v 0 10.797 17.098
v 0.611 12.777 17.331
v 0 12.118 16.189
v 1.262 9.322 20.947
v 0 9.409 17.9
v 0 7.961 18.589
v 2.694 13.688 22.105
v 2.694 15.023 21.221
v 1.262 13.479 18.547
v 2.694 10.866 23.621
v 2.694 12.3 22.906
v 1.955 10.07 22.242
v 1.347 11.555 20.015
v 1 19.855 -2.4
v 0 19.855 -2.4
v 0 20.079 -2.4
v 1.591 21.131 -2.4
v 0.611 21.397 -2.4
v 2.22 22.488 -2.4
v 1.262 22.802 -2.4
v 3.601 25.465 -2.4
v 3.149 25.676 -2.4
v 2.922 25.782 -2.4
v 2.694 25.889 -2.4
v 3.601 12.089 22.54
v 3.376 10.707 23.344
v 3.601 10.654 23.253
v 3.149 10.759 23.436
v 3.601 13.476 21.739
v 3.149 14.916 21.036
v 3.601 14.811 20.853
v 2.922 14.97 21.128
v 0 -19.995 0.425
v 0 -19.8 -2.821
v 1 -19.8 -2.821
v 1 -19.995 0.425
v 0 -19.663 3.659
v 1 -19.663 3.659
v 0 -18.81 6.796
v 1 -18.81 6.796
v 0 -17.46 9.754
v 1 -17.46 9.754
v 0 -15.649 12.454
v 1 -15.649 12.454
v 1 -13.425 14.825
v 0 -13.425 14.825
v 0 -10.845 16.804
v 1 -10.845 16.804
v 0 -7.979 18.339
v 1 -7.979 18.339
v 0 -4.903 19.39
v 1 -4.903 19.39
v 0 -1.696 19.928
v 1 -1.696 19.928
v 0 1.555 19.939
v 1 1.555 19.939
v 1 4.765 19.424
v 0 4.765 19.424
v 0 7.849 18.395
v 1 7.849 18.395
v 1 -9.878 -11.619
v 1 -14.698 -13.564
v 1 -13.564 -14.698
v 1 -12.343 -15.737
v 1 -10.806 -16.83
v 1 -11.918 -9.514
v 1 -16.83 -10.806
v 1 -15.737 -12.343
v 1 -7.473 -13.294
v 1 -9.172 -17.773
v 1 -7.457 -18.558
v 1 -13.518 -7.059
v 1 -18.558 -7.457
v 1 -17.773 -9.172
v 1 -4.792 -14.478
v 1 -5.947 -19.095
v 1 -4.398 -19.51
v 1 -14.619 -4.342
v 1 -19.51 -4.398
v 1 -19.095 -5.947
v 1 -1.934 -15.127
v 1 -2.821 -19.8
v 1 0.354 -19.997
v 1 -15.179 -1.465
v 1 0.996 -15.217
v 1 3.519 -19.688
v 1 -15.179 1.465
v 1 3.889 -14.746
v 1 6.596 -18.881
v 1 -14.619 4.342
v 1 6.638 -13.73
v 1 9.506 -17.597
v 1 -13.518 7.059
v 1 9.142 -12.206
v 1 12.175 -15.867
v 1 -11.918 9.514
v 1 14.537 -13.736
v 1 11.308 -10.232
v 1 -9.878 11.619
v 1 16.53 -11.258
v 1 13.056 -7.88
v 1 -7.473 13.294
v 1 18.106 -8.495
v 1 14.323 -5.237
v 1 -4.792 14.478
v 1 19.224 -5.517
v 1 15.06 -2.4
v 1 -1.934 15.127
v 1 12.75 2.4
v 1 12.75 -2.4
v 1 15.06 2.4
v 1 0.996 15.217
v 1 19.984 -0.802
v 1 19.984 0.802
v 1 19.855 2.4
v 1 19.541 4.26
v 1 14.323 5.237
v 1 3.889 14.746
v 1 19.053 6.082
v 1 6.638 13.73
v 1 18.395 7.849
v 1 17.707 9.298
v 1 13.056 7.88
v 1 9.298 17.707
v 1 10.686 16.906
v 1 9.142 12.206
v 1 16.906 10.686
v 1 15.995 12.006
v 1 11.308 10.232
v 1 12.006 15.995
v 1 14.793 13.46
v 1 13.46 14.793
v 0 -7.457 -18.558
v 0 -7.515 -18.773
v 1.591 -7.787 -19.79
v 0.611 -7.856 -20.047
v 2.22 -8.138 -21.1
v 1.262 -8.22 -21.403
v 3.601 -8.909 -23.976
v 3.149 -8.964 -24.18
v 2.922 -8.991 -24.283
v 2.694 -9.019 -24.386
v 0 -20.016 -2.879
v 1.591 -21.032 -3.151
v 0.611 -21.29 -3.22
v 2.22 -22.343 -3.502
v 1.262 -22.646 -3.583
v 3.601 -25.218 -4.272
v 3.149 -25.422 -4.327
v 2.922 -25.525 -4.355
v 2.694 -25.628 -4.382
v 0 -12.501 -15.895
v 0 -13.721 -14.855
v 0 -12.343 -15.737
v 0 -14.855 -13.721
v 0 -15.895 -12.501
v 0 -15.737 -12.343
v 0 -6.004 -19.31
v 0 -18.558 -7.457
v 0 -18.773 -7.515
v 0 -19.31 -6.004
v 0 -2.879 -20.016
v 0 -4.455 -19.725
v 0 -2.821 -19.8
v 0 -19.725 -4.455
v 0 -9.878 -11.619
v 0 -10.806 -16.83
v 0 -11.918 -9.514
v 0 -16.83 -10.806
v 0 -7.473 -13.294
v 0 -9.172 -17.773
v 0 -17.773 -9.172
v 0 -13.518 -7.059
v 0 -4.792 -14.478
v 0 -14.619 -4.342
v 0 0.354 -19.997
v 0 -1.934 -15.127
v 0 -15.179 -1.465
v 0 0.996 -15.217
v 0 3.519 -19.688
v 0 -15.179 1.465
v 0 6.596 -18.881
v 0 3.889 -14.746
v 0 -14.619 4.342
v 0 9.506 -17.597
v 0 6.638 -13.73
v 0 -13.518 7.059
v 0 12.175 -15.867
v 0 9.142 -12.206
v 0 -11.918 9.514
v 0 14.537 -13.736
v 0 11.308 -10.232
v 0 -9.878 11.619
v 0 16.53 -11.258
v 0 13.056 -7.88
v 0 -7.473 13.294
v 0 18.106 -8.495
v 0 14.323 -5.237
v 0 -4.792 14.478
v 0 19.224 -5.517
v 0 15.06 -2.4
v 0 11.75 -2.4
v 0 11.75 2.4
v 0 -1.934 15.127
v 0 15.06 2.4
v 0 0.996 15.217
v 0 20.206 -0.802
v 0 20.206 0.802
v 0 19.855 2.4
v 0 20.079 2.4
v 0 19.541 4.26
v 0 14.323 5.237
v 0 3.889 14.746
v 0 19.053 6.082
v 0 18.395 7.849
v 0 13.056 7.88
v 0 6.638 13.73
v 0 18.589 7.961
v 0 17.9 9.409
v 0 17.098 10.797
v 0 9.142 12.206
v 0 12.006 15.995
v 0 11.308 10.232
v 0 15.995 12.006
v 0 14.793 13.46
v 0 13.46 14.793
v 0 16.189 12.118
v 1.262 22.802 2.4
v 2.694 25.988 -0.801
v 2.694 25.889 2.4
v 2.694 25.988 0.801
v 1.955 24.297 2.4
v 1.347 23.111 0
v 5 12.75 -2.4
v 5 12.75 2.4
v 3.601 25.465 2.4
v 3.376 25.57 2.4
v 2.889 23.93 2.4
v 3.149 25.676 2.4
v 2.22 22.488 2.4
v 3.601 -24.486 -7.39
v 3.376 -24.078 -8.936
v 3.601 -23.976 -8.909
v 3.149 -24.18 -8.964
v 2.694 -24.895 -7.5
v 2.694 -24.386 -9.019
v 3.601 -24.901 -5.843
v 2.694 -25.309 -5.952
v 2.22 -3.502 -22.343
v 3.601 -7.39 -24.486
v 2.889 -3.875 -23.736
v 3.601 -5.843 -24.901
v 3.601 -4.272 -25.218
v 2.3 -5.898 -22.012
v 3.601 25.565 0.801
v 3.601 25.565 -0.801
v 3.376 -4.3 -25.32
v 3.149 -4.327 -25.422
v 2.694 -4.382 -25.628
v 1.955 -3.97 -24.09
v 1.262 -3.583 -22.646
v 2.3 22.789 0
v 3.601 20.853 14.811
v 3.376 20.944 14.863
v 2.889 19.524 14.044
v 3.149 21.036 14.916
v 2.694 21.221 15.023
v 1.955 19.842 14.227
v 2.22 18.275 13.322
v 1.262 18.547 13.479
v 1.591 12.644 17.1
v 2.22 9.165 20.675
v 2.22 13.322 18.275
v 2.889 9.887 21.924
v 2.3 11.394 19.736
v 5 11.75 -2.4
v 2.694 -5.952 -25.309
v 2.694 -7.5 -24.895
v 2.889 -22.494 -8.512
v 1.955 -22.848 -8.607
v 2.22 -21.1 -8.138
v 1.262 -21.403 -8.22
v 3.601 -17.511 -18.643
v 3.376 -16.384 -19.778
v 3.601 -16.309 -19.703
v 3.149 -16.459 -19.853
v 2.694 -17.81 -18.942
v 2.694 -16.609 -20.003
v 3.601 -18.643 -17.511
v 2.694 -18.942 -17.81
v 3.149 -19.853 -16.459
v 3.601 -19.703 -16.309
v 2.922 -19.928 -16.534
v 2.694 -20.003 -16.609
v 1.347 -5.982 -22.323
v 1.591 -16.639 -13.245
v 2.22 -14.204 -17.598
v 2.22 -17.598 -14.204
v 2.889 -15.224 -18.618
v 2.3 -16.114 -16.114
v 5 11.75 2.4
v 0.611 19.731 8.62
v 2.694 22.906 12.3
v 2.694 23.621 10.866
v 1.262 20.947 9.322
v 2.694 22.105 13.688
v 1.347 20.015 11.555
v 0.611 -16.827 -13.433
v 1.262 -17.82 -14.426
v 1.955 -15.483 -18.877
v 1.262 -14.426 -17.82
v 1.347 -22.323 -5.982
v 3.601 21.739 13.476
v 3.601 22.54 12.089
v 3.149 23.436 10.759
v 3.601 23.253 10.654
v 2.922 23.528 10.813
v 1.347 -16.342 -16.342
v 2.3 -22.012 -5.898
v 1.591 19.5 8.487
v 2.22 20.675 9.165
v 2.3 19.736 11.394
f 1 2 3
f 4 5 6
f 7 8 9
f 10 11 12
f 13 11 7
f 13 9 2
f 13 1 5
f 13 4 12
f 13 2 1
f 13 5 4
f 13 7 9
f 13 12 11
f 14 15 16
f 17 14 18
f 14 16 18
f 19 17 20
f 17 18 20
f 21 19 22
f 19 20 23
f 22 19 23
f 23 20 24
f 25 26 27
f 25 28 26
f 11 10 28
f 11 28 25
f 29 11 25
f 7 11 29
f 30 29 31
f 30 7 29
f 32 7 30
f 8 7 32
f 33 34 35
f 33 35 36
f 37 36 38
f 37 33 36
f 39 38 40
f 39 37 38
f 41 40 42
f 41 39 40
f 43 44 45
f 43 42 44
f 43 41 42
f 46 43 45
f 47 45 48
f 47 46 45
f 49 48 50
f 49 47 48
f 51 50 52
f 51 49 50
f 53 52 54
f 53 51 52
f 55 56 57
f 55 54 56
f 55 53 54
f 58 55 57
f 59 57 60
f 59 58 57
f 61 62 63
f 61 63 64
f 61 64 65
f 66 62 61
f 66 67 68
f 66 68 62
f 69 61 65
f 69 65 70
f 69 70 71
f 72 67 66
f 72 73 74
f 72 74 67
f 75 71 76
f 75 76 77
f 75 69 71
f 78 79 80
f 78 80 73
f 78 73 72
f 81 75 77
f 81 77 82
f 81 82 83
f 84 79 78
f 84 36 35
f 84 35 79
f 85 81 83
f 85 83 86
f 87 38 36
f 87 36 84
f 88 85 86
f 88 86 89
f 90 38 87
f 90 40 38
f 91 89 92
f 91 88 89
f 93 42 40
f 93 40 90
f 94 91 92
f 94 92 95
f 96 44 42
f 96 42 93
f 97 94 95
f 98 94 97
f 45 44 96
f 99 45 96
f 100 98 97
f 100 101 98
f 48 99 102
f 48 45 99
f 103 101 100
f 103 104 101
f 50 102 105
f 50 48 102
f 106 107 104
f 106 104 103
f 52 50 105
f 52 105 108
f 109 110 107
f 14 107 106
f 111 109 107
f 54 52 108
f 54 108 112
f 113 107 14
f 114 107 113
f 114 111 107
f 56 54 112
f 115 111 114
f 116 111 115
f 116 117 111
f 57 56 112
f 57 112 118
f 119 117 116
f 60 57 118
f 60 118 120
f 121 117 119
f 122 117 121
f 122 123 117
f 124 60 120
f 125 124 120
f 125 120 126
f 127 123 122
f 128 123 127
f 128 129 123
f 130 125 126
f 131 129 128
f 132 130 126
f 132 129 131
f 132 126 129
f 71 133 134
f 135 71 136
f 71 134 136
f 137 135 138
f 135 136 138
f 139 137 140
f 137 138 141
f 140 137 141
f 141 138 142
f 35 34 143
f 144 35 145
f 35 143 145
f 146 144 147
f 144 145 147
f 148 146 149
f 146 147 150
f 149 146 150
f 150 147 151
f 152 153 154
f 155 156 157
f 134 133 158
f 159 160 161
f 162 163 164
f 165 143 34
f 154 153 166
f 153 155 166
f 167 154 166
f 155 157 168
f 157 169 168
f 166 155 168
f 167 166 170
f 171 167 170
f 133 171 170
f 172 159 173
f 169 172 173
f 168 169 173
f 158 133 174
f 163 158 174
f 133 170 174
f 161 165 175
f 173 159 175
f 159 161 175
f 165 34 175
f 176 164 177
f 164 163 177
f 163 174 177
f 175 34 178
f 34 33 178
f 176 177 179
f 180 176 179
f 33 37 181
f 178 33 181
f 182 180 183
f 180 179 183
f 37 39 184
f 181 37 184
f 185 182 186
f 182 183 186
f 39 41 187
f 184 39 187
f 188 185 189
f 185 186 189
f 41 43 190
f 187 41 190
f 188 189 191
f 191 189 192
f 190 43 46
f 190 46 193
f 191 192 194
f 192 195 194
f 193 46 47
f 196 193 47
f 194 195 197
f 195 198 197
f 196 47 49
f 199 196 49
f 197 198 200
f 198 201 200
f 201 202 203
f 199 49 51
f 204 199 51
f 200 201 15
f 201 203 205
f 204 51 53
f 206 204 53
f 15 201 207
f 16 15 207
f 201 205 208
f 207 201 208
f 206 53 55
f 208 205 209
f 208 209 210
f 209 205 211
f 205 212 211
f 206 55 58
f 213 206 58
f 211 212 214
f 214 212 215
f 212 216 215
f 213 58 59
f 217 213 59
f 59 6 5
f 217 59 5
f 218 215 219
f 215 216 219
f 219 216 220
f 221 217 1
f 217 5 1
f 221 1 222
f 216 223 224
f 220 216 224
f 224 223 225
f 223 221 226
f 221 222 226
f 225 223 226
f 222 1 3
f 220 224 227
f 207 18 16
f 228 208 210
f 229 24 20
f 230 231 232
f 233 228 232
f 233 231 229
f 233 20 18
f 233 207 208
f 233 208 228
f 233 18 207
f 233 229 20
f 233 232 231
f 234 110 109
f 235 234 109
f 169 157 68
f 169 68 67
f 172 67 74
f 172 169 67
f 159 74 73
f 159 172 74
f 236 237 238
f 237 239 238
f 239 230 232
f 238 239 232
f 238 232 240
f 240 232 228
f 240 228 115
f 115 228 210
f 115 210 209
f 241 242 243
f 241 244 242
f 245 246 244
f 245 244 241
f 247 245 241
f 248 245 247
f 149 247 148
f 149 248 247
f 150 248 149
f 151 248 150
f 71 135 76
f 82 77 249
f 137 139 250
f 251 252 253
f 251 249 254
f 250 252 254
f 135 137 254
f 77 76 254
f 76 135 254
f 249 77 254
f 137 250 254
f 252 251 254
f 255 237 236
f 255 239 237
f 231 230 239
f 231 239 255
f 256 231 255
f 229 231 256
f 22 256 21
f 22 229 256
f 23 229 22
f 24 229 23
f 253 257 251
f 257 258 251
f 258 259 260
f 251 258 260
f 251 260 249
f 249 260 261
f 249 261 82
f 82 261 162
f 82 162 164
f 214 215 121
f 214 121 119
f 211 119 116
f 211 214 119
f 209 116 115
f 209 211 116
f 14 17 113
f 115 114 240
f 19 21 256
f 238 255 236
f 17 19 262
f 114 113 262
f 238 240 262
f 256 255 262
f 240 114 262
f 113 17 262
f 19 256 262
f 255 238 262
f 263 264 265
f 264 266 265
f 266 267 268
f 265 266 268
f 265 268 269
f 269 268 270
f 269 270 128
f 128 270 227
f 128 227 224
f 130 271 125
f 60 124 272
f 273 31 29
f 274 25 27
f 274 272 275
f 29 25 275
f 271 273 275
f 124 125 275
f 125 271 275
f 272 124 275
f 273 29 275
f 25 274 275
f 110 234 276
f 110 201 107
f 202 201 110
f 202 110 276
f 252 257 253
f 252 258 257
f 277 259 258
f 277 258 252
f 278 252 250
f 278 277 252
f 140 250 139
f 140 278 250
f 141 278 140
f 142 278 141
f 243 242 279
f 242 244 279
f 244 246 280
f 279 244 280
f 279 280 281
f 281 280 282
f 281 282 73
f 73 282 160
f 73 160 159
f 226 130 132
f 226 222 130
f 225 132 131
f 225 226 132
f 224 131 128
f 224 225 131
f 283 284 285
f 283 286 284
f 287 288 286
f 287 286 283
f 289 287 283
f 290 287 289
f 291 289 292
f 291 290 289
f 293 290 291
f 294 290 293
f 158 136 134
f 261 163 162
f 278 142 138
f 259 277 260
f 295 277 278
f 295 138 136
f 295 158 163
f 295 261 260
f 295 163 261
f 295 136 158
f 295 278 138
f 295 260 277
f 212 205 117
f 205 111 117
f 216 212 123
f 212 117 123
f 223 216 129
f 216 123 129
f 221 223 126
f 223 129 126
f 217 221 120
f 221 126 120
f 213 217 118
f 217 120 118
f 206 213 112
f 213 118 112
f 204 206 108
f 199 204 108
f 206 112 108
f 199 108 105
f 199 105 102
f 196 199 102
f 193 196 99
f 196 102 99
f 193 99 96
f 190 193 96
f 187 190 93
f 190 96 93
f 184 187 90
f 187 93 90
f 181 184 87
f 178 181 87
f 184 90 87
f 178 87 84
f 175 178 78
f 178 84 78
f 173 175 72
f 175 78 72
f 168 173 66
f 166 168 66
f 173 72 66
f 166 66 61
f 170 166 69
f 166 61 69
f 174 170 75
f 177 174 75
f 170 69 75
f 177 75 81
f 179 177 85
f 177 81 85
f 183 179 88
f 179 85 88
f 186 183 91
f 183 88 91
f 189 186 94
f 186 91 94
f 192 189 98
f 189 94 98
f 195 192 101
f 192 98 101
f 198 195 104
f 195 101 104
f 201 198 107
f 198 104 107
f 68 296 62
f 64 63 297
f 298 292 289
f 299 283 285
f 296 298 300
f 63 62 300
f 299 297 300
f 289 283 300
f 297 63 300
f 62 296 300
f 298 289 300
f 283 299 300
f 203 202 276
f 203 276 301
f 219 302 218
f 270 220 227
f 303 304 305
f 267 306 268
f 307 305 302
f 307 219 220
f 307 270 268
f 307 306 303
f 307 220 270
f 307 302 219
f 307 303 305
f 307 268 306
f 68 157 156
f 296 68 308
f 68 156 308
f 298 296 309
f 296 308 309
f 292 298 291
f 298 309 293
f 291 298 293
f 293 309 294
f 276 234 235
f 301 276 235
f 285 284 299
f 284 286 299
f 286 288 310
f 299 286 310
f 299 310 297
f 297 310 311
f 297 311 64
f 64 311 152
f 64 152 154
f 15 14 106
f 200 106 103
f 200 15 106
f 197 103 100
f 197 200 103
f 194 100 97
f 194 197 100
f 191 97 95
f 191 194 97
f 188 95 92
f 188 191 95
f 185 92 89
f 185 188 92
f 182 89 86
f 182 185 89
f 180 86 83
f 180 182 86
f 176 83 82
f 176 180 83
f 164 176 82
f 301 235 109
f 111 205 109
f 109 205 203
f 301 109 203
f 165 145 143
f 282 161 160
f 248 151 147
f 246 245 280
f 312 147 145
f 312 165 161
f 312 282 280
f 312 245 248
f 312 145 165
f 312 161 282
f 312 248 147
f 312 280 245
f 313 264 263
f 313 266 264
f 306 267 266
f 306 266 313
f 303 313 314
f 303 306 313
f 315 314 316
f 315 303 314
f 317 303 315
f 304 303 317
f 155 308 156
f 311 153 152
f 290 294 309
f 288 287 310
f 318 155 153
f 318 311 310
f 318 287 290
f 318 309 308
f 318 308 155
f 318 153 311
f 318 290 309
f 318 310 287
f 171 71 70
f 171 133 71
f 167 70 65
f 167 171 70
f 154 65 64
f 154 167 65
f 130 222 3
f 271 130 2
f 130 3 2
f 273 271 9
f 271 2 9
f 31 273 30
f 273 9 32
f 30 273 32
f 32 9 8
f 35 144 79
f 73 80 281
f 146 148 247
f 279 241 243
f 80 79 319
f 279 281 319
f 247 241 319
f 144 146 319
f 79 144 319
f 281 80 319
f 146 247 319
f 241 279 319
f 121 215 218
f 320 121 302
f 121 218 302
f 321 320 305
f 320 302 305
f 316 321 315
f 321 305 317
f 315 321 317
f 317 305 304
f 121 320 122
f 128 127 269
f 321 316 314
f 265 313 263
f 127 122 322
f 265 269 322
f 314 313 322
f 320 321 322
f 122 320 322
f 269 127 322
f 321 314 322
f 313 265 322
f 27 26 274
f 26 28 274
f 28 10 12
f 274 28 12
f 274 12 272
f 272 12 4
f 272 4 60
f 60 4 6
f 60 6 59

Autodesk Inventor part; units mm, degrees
ref_plane "YZ Plane" through (0, 0, 0) normal (1, 0, 0) x (0, 1, 0)
ref_plane "XZ Plane" through (0, 0, 0) normal (0, 1, 0) x (-1, 0, 0)
sketch "草图1" plane through (0, 0, 0) normal (0, 0, 1) x (1, 0, 0)
  line L0 (-0.580263, 0) -> (3.481577, 0)
  line L1 (0, 3.8) -> (0, 13.95)
  line L2 (0, 20.221695) -> (2.694468, 26)
  line L3 (2.694468, 26) -> (3.600776, 25.577382)
  line L4 (3.600776, 25.577382) -> (1, 20)
  line L5 (1, 20) -> (1, 15.25)
  line L6 (1, 15.25) -> (0, 15.25)
  dimension "d1" = 1
  dimension "d2" = 30.5
  dimension "d3" = 40
  dimension "d4" = 52
  dimension "d5" = 25
  dimension "d6" = 1
sketch "草图1 outline for 轴承体" plane through (0, 0, 0) normal (0, 0, 1) x (1, 0, 0)
  line L0 (2.694468, 26) -> (0, 20.221695)
  line L1 (3.600776, 25.577382) -> (2.694468, 26)
  line L2 (1, 20) -> (3.600776, 25.577382)
  line L3 (1, 15.25) -> (1, 20)
  line L4 (0, 15.25) -> (1, 15.25)
  line L5 (0, 20.221695) -> (0, 15.25)
revolve "轴承体" add sketch "草图1 outline for 轴承体" angle 360 about axis through (-10, 0, 0) along (1, 0, 0)
sketch "草图2" plane through (0, 0, 0) normal (-1, 0, 0) x (0, 0, 1)
  line L0 (0, -36.4) -> (0, 36.4)
  line L1 (2.4, 15.059963) -> (2.4, 11.75)
  line L2 (2.4, 11.75) -> (0, 11.75)
  line L3 (-2.4, 15.059963) -> (-2.4, 11.75)
  line L4 (-2.4, 11.75) -> (0, 11.75)
  line L5 (-36.4, 0) -> (36.4, 0)
  circle A0 centre (0, 0) radius 15.25
  circle A1 centre (0, 0) radius 26
  circle A2 centre (0, 0) radius 20
  line L6 (-2.4, 12.75) -> (2.4, 12.75)
  circle A3 centre (0, 0) radius 20.221695
  line L7 (2.4, 19.855478) -> (2.4, 25.888994)
  line L8 (0, 36.4) -> (0, -36.4)
  line L9 (0, 0) -> (13, 22.51666) construction
  line L10 (7.849278, 18.395348) -> (10.866036, 23.620526)
  line L11 (12.0062, 15.995348) -> (15.022958, 21.220526)
  line L12 (-2.4, 19.855478) -> (-2.4, 25.888994)
  line L13 (0, 0) -> (22.51666, 13) construction
  line L14 (15.995348, 12.0062) -> (21.220526, 15.022958)
  line L15 (18.395348, 7.849278) -> (23.620526, 10.866036)
  line L16 (0, 0) -> (-25.114071, -6.729295) construction
  line L17 (-19.800085, -2.820754) -> (-25.628013, -4.382343)
  line L18 (-18.557753, -7.457198) -> (-24.385682, -9.018787)
  line L19 (0, 0) -> (-18.384776, -18.384776) construction
  line L20 (0, 0) -> (-6.729295, -25.114071) construction
  line L21 (-15.736999, -12.342887) -> (-20.003339, -16.609227)
  line L22 (-12.342887, -15.736999) -> (-16.609227, -20.003339)
  line L23 (-7.457198, -18.557753) -> (-9.018787, -24.385682)
  line L24 (-2.820754, -19.800085) -> (-4.382343, -25.628013)
  dimension "d9" = 4.8
  dimension "d21" = 1
  dimension "d25" = 27
  dimension "d32" = 4.8
  dimension "d34" = 4.8
  dimension "d36" = 30
  dimension "d38" = 2.4
  dimension "d39" = 30
  dimension "d40" = 15
  dimension "d41" = 4.8
  dimension "d42" = 30
  dimension "d43" = 30
  dimension "d45" = 4.8
  dimension "d47" = 4.8
sketch "草图2 outline for 切口" plane through (0, 0, 0) normal (-1, 0, 0) x (0, 0, 1)
  arc A0 (-7.457198, -18.557753) -> (-12.342887, -15.736999) centre (0, 0) cw
  line L0 (-9.018787, -24.385682) -> (-7.457198, -18.557753)
  arc A1 (-16.609227, -20.003339) -> (-9.018787, -24.385682) centre (0, 0) ccw
  line L1 (-12.342887, -15.736999) -> (-16.609227, -20.003339)
  arc A2 (-15.736999, -12.342887) -> (-18.557753, -7.457198) centre (0, 0) cw
  line L2 (-20.003339, -16.609227) -> (-15.736999, -12.342887)
  arc A3 (-24.385682, -9.018787) -> (-20.003339, -16.609227) centre (0, 0) ccw
  line L3 (-18.557753, -7.457198) -> (-24.385682, -9.018787)
  line L4 (2.4, 25.888994) -> (2.4, 19.855478)
  arc A4 (10.866036, 23.620526) -> (2.4, 25.888994) centre (0, 0) ccw
  line L5 (7.849278, 18.395348) -> (10.866036, 23.620526)
  arc A5 (2.4, 19.855478) -> (7.849278, 18.395348) centre (0, 0) cw
  line L6 (15.022958, 21.220526) -> (12.0062, 15.995348)
  arc A6 (21.220526, 15.022958) -> (15.022958, 21.220526) centre (0, 0) ccw
  line L7 (15.995348, 12.0062) -> (21.220526, 15.022958)
  arc A7 (12.0062, 15.995348) -> (15.995348, 12.0062) centre (0, 0) cw
  arc A8 (-19.800085, -2.820754) -> (-2.4, 19.855478) centre (0, 0) cw
  line L8 (-25.628013, -4.382343) -> (-19.800085, -2.820754)
  arc A9 (-2.4, 25.888994) -> (-25.628013, -4.382343) centre (0, 0) ccw
  line L9 (-2.4, 19.855478) -> (-2.4, 25.888994)
  line L10 (23.620526, 10.866036) -> (18.395348, 7.849278)
  arc A10 (-4.382343, -25.628013) -> (23.620526, 10.866036) centre (0, 0) ccw
  line L11 (-2.820754, -19.800085) -> (-4.382343, -25.628013)
  arc A11 (18.395348, 7.849278) -> (-2.820754, -19.800085) centre (0, 0) cw
extrude "切口" cut sketch "草图2 outline for 切口" against normal through all
extrude "榫1" add sketch "草图2" against normal blind 1 contours L4 L3 L6 L0 | L0 L6 L1 L2 | A0 L0 L6 L3 | L1 L6 L0 A0
extrude "榫2" add sketch "草图2" against normal blind 5 contours L4 L3 L6 L0 | L0 L6 L1 L2
ref_plane "Work Plane1" through (0.5, 0, 0) normal (0, 0, -1) x (1, 0, 0)
equation "\"d1\" = SD"
equation "\"d2\" = SD1"
equation "\"d3\" = LADI"
equation "\"d4\" = SD2"
equation "\"d5\" = FAWI"
equation "\"d6\" = SD"
equation "\"d9\" = TW0"
equation "\"d21\" = SD"
equation "\"d25\" = SD3"
equation "\"d32\" = TW0"
equation "\"d34\" = TW0"
equation "\"d36\" = SEWI"
equation "\"d39\" = SEWI"
equation "\"d40\" = ANG1"
equation "\"d41\" = TW0"
equation "\"d42\" = SEWI"
equation "\"d43\" = SEWI"
equation "\"d45\" = TW0"
equation "\"d47\" = TW0"
equation "\"d17\" = SD"
equation "\"d13\" = SD"
equation "\"d23\" = TL1"
equation "\"FAWI\" = 25deg"
equation "\"SD1\" = 30.5"
equation "\"SD2\" = 52"
equation "\"SD\" = 1"
equation "\"TW0\" = 4.8"
equation "\"LADI\" = 40"
equation "\"d8\" = SD1"
equation "\"TL1\" = 5"
equation "\"SD3\" = 27"
equation "\"SEWI\" = 30deg"
equation "\"ANG1\" = 15deg"
equation "\"RR\" = 0.1"
equation "\"PB\" = TW0"
equation "\"PNT\" = TL1"
properties part number "垫圈 GB 858 30" material "钢，软"
